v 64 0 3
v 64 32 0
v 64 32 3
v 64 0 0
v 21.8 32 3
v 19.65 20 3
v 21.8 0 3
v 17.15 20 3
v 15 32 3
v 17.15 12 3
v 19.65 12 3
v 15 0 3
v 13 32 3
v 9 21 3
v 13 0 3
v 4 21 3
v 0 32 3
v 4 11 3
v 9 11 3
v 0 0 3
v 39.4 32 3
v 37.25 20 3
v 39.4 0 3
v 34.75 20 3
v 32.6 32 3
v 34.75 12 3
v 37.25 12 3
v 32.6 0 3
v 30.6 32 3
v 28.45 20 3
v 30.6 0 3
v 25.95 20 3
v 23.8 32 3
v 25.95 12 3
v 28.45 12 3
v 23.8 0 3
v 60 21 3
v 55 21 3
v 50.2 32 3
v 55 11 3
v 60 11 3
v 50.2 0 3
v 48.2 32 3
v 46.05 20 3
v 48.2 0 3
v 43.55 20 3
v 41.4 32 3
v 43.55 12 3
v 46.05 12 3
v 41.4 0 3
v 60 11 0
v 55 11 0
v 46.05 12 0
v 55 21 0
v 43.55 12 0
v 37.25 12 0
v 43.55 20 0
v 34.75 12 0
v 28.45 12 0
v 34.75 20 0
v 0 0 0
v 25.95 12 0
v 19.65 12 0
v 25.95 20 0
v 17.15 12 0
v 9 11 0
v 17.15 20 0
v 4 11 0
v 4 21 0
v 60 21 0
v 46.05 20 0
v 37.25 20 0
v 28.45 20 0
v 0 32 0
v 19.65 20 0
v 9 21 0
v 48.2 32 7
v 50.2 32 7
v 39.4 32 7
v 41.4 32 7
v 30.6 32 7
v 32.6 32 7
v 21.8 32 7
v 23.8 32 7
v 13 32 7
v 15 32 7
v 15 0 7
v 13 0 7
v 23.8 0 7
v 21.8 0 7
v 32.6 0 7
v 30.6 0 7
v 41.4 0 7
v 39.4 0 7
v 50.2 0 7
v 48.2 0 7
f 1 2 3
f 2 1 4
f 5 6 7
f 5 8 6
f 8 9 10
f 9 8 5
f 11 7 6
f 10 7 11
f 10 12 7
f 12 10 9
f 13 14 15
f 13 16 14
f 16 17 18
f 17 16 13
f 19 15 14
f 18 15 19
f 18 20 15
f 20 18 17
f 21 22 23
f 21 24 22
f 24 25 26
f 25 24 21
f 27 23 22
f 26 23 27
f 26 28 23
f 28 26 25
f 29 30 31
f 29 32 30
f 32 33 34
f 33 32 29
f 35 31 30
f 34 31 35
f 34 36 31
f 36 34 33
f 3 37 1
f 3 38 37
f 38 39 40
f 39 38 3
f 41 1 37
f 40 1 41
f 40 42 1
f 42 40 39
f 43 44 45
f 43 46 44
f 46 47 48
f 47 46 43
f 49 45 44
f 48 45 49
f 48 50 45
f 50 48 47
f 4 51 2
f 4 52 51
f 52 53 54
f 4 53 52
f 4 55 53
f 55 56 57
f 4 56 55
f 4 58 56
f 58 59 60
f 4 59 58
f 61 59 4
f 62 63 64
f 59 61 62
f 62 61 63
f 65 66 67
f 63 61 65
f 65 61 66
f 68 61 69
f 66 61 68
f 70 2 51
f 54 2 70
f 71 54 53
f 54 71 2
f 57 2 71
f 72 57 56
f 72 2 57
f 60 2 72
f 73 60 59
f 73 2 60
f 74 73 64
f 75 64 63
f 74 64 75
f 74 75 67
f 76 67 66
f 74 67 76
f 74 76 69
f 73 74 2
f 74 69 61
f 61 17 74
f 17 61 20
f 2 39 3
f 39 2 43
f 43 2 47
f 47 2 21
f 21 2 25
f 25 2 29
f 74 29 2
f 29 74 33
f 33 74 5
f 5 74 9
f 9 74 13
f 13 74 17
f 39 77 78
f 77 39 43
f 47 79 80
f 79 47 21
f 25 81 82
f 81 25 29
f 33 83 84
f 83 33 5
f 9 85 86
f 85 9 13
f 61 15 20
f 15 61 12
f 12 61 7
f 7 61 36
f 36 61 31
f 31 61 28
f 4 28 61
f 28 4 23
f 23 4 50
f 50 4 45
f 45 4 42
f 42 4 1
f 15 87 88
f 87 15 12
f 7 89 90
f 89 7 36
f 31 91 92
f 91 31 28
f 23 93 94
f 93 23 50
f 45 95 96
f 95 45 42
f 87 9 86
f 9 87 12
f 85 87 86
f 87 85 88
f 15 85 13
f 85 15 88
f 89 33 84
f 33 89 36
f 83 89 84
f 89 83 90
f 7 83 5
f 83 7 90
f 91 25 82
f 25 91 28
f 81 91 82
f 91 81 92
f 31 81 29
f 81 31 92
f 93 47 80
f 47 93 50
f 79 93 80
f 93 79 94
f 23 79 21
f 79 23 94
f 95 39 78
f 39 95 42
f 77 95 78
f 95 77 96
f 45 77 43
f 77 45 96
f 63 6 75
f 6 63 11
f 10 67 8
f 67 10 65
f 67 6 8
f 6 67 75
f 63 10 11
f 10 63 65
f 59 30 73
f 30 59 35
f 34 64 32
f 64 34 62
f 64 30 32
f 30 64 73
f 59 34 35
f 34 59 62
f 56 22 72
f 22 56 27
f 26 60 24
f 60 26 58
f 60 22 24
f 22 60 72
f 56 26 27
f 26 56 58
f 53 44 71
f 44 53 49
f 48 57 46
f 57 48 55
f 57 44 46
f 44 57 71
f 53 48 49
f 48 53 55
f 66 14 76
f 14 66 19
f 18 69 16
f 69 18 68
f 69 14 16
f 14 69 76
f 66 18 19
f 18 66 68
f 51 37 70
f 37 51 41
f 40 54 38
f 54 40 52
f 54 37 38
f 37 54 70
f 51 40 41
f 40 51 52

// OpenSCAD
// Original MechIntel educational model. CC0-1.0. Units: mm.
// Not a standardized or load-rated component.
$fn=96;
length=64;
width=32;
base=3;
rail_height=4;
$fn=64;
difference(){union(){
translate([0,0,0]) cube([length,width,base]);
translate([13,0,base]) cube([2,width,rail_height]);
translate([21.8,0,base]) cube([2,width,rail_height]);
translate([30.6,0,base]) cube([2,width,rail_height]);
translate([39.4,0,base]) cube([2,width,rail_height]);
translate([48.2,0,base]) cube([2,width,rail_height]);
}
translate([17.15,12,-1]) cube([2.5,8,base+2]);
translate([25.95,12,-1]) cube([2.5,8,base+2]);
translate([34.75,12,-1]) cube([2.5,8,base+2]);
translate([43.55,12,-1]) cube([2.5,8,base+2]);
translate([4,11,-1]) cube([5,10,base+2]);
translate([55,11,-1]) cube([5,10,base+2]);
}
